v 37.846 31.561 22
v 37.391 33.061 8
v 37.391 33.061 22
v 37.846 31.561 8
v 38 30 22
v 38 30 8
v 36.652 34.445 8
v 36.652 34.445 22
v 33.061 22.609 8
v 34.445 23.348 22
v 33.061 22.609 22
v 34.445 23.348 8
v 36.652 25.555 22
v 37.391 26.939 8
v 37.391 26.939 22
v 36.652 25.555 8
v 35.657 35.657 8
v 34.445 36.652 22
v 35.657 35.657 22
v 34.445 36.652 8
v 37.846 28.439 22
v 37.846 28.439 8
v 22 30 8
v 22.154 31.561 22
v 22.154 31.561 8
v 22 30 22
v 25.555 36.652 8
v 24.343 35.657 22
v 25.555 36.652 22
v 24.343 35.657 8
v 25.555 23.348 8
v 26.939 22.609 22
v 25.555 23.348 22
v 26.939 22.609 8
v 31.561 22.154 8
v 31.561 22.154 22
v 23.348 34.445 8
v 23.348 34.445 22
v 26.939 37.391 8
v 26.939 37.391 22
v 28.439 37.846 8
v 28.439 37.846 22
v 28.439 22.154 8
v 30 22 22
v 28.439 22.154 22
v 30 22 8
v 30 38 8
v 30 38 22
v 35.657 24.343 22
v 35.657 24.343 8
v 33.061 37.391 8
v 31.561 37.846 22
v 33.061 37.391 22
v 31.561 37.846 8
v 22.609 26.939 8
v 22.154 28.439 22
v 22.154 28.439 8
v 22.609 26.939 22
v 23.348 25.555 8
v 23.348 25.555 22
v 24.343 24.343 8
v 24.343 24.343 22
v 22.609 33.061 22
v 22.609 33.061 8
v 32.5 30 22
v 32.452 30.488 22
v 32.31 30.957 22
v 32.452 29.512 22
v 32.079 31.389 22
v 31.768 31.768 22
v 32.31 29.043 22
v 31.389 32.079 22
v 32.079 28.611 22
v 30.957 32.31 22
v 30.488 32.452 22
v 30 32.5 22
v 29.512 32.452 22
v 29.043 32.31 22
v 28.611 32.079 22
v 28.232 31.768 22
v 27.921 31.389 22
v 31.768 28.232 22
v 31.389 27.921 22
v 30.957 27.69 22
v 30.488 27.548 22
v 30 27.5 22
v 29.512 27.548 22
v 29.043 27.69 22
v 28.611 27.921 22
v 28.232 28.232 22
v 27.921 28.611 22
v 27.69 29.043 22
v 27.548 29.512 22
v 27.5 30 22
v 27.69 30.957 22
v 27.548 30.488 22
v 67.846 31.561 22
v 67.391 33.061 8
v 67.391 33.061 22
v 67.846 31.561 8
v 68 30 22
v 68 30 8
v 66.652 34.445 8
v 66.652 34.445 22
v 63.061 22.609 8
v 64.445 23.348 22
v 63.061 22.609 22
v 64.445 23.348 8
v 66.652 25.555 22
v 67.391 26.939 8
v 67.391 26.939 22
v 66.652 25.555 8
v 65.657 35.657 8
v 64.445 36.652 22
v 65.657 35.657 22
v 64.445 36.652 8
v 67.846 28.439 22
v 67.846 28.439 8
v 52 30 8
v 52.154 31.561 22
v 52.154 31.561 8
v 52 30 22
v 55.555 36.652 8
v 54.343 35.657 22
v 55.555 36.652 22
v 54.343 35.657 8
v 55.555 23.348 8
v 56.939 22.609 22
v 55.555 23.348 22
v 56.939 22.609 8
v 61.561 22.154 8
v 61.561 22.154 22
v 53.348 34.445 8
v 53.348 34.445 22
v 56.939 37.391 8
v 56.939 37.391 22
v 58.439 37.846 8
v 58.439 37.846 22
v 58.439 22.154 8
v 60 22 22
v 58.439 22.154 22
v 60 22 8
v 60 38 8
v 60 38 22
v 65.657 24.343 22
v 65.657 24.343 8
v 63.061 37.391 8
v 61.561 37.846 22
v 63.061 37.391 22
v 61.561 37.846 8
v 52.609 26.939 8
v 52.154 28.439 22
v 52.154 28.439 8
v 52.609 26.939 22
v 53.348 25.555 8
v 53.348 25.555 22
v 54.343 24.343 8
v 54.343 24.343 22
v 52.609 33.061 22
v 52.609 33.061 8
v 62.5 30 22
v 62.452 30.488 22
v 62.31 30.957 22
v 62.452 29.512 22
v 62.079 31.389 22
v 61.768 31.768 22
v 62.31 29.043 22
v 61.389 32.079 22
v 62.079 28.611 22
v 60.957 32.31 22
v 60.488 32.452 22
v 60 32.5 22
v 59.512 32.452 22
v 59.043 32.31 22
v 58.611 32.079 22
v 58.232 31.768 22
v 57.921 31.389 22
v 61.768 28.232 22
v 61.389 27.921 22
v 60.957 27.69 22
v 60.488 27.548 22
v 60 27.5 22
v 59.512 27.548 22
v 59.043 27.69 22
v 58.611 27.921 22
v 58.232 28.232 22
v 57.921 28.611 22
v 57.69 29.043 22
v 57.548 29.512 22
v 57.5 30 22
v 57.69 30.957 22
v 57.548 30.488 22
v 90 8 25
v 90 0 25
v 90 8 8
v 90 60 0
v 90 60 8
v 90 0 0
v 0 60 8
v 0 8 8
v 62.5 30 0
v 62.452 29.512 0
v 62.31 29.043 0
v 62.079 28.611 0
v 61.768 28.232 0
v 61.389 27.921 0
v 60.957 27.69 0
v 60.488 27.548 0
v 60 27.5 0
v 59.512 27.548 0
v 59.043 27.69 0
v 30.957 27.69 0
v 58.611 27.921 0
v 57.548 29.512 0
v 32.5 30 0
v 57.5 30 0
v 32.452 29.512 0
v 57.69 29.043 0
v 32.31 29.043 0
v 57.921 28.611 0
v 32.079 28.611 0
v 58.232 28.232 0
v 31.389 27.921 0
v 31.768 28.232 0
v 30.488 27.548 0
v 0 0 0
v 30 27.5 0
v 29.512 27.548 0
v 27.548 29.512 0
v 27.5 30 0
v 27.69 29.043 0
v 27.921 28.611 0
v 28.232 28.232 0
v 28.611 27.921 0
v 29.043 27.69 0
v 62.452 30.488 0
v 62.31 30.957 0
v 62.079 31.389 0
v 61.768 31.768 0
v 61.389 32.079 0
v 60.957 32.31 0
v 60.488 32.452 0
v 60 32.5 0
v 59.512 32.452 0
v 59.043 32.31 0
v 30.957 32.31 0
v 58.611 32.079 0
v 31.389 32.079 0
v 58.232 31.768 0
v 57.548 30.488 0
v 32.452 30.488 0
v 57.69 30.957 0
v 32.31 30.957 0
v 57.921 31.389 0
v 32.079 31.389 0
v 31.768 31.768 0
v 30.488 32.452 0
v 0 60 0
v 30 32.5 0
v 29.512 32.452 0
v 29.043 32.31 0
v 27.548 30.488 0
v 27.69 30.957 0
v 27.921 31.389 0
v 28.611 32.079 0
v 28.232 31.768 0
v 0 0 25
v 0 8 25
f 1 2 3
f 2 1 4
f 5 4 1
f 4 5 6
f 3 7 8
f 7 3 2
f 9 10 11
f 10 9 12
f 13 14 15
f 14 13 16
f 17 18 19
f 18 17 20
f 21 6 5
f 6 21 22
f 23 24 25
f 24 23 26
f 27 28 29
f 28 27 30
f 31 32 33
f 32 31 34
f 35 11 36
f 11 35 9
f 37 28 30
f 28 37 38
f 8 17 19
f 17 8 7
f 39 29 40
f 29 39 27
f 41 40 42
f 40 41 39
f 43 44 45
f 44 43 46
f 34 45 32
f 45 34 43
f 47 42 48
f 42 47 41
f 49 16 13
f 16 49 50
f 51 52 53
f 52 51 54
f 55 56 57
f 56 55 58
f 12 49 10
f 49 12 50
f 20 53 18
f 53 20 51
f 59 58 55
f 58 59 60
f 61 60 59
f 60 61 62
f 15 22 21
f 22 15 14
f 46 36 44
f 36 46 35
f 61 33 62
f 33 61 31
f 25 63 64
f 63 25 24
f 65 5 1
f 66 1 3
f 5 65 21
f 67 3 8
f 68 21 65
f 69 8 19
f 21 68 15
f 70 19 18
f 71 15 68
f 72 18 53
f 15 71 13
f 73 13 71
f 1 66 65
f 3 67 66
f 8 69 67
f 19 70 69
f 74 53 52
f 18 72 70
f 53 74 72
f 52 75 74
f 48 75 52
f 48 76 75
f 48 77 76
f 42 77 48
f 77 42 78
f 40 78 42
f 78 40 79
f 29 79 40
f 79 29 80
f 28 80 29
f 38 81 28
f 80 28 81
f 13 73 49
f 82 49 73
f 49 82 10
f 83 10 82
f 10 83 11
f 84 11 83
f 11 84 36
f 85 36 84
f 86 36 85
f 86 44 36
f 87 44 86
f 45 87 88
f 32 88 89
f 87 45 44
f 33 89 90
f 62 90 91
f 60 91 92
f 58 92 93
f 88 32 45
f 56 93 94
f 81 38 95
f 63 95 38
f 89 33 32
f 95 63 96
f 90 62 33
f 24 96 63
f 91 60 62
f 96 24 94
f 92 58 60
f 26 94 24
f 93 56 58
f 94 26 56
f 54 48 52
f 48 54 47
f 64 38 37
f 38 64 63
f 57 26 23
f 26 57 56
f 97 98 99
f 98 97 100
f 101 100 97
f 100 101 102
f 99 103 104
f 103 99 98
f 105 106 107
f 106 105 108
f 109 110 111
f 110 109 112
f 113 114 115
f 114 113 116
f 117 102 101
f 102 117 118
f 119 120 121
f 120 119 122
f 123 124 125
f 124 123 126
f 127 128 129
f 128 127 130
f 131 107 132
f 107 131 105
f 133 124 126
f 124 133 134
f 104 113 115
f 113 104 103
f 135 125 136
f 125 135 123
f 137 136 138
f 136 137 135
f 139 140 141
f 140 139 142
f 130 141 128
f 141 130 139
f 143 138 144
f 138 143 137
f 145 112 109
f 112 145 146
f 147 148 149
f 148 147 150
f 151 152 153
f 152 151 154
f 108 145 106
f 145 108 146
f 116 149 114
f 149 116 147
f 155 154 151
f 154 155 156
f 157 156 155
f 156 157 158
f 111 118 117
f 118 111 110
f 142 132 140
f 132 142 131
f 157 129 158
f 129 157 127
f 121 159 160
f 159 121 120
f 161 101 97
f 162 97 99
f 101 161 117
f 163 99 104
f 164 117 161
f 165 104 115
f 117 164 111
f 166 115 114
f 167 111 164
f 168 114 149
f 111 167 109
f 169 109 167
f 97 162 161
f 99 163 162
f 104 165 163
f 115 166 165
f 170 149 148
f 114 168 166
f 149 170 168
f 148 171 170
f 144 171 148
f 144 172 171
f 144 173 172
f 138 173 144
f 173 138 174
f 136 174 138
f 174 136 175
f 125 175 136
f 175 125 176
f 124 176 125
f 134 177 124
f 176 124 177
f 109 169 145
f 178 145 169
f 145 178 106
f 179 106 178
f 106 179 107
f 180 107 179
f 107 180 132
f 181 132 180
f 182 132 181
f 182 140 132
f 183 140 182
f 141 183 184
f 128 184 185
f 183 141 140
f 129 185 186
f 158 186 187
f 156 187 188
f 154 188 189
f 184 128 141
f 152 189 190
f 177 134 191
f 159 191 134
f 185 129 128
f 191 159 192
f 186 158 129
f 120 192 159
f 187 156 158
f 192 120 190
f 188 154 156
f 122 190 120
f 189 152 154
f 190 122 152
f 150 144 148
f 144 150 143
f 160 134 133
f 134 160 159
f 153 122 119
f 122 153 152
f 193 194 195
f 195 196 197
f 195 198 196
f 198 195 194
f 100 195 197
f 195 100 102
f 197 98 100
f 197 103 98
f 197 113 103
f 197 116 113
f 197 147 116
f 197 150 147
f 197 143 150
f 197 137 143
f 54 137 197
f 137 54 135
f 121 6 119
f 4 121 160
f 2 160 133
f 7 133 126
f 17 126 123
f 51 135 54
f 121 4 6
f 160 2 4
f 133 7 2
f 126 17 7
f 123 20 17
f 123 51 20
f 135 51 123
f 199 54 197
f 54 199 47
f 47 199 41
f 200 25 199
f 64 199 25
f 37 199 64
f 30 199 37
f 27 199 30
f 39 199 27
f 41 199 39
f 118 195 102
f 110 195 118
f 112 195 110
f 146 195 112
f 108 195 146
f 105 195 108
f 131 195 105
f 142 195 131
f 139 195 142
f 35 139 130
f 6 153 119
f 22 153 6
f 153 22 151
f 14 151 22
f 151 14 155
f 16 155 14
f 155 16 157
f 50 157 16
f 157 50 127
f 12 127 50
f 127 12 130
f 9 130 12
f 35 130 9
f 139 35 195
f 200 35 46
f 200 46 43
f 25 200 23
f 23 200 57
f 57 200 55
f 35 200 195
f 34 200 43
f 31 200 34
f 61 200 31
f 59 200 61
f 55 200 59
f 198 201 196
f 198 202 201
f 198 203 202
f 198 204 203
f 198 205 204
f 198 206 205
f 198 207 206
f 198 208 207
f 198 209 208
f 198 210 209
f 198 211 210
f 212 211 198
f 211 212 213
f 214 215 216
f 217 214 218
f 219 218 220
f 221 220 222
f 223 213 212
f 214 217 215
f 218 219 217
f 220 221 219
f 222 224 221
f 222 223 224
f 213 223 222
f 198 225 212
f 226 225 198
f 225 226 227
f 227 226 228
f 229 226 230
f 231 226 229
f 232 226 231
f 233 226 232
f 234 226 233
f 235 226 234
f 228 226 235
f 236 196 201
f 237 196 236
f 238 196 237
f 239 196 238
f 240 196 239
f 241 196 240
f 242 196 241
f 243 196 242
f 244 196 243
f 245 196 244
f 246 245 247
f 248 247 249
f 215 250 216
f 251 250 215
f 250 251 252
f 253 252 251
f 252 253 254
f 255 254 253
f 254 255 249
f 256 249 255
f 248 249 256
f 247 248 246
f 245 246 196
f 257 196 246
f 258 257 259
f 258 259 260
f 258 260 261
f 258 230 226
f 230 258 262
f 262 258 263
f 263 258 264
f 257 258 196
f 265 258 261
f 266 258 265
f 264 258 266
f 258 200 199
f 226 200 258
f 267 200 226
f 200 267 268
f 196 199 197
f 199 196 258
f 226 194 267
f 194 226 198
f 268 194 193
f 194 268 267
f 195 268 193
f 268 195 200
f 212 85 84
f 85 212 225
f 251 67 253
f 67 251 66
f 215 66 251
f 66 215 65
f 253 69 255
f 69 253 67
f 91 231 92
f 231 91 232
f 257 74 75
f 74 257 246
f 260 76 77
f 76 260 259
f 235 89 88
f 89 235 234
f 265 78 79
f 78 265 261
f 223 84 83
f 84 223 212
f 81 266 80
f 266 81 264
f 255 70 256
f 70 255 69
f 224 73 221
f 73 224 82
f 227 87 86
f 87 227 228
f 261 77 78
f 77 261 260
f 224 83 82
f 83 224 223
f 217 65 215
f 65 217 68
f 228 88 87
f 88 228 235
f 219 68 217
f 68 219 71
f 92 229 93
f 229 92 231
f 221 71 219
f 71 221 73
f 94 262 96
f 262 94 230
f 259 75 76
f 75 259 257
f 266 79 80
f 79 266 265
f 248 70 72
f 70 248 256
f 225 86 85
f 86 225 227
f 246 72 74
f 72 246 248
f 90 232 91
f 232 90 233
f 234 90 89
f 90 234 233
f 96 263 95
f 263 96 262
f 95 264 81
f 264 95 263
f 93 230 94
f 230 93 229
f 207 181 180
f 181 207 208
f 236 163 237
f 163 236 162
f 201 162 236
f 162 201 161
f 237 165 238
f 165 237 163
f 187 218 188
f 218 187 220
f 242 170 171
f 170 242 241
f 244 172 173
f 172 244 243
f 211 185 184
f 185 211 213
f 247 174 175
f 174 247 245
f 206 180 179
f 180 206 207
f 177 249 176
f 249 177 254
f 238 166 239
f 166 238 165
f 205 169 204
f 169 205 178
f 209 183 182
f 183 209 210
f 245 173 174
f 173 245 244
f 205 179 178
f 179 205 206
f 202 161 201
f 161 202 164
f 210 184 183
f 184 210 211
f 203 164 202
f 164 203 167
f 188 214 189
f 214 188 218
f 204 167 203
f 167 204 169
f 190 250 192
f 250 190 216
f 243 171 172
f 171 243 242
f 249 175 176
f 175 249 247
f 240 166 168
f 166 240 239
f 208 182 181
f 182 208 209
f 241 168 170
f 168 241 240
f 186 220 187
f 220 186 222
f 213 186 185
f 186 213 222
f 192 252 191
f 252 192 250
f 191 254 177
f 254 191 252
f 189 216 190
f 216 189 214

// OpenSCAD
$fn = 32;

// ----------------------------------------------------------------------
// Drill jig: fence jig
// ----------------------------------------------------------------------

// --- parameters (mm) ---
plate_l = 90;             // plate length, X
plate_w = 60;             // plate width, Y
plate_t = 8;              // plate thickness
boss_d = 16;              // guide boss diameter
boss_h = 15;              // boss height above the plate
guide_d = 5;              // guide hole diameter
boss_pitch = 30;          // boss pitch
fence_h = 18;             // fence height above the plate
fence_t = 8;              // fence thickness

n_boss = 2;  // guide bosses
boss_x0 = (plate_l - (n_boss - 1) * boss_pitch) / 2;  // first boss X
boss_top = plate_t - 1 + boss_h;  // boss crown height
fence_top = plate_t - 1 + fence_h;  // fence crown height
total_h = max([fence_top, boss_top]);  // overall height

difference() {
  union() {
  cube([plate_l, plate_w, plate_t]);
  for (i = [0 : n_boss - 1])
    translate([boss_x0 + i * boss_pitch, plate_w / 2, plate_t - 1])
      cylinder(h = boss_h, d = boss_d);
  translate([0, 0, plate_t - 1]) cube([plate_l, fence_t, fence_h]);
  }
  for (i = [0 : n_boss - 1])
    translate([boss_x0 + i * boss_pitch, plate_w / 2, -1])
      cylinder(h = plate_t + boss_h, d = guide_d);
}
